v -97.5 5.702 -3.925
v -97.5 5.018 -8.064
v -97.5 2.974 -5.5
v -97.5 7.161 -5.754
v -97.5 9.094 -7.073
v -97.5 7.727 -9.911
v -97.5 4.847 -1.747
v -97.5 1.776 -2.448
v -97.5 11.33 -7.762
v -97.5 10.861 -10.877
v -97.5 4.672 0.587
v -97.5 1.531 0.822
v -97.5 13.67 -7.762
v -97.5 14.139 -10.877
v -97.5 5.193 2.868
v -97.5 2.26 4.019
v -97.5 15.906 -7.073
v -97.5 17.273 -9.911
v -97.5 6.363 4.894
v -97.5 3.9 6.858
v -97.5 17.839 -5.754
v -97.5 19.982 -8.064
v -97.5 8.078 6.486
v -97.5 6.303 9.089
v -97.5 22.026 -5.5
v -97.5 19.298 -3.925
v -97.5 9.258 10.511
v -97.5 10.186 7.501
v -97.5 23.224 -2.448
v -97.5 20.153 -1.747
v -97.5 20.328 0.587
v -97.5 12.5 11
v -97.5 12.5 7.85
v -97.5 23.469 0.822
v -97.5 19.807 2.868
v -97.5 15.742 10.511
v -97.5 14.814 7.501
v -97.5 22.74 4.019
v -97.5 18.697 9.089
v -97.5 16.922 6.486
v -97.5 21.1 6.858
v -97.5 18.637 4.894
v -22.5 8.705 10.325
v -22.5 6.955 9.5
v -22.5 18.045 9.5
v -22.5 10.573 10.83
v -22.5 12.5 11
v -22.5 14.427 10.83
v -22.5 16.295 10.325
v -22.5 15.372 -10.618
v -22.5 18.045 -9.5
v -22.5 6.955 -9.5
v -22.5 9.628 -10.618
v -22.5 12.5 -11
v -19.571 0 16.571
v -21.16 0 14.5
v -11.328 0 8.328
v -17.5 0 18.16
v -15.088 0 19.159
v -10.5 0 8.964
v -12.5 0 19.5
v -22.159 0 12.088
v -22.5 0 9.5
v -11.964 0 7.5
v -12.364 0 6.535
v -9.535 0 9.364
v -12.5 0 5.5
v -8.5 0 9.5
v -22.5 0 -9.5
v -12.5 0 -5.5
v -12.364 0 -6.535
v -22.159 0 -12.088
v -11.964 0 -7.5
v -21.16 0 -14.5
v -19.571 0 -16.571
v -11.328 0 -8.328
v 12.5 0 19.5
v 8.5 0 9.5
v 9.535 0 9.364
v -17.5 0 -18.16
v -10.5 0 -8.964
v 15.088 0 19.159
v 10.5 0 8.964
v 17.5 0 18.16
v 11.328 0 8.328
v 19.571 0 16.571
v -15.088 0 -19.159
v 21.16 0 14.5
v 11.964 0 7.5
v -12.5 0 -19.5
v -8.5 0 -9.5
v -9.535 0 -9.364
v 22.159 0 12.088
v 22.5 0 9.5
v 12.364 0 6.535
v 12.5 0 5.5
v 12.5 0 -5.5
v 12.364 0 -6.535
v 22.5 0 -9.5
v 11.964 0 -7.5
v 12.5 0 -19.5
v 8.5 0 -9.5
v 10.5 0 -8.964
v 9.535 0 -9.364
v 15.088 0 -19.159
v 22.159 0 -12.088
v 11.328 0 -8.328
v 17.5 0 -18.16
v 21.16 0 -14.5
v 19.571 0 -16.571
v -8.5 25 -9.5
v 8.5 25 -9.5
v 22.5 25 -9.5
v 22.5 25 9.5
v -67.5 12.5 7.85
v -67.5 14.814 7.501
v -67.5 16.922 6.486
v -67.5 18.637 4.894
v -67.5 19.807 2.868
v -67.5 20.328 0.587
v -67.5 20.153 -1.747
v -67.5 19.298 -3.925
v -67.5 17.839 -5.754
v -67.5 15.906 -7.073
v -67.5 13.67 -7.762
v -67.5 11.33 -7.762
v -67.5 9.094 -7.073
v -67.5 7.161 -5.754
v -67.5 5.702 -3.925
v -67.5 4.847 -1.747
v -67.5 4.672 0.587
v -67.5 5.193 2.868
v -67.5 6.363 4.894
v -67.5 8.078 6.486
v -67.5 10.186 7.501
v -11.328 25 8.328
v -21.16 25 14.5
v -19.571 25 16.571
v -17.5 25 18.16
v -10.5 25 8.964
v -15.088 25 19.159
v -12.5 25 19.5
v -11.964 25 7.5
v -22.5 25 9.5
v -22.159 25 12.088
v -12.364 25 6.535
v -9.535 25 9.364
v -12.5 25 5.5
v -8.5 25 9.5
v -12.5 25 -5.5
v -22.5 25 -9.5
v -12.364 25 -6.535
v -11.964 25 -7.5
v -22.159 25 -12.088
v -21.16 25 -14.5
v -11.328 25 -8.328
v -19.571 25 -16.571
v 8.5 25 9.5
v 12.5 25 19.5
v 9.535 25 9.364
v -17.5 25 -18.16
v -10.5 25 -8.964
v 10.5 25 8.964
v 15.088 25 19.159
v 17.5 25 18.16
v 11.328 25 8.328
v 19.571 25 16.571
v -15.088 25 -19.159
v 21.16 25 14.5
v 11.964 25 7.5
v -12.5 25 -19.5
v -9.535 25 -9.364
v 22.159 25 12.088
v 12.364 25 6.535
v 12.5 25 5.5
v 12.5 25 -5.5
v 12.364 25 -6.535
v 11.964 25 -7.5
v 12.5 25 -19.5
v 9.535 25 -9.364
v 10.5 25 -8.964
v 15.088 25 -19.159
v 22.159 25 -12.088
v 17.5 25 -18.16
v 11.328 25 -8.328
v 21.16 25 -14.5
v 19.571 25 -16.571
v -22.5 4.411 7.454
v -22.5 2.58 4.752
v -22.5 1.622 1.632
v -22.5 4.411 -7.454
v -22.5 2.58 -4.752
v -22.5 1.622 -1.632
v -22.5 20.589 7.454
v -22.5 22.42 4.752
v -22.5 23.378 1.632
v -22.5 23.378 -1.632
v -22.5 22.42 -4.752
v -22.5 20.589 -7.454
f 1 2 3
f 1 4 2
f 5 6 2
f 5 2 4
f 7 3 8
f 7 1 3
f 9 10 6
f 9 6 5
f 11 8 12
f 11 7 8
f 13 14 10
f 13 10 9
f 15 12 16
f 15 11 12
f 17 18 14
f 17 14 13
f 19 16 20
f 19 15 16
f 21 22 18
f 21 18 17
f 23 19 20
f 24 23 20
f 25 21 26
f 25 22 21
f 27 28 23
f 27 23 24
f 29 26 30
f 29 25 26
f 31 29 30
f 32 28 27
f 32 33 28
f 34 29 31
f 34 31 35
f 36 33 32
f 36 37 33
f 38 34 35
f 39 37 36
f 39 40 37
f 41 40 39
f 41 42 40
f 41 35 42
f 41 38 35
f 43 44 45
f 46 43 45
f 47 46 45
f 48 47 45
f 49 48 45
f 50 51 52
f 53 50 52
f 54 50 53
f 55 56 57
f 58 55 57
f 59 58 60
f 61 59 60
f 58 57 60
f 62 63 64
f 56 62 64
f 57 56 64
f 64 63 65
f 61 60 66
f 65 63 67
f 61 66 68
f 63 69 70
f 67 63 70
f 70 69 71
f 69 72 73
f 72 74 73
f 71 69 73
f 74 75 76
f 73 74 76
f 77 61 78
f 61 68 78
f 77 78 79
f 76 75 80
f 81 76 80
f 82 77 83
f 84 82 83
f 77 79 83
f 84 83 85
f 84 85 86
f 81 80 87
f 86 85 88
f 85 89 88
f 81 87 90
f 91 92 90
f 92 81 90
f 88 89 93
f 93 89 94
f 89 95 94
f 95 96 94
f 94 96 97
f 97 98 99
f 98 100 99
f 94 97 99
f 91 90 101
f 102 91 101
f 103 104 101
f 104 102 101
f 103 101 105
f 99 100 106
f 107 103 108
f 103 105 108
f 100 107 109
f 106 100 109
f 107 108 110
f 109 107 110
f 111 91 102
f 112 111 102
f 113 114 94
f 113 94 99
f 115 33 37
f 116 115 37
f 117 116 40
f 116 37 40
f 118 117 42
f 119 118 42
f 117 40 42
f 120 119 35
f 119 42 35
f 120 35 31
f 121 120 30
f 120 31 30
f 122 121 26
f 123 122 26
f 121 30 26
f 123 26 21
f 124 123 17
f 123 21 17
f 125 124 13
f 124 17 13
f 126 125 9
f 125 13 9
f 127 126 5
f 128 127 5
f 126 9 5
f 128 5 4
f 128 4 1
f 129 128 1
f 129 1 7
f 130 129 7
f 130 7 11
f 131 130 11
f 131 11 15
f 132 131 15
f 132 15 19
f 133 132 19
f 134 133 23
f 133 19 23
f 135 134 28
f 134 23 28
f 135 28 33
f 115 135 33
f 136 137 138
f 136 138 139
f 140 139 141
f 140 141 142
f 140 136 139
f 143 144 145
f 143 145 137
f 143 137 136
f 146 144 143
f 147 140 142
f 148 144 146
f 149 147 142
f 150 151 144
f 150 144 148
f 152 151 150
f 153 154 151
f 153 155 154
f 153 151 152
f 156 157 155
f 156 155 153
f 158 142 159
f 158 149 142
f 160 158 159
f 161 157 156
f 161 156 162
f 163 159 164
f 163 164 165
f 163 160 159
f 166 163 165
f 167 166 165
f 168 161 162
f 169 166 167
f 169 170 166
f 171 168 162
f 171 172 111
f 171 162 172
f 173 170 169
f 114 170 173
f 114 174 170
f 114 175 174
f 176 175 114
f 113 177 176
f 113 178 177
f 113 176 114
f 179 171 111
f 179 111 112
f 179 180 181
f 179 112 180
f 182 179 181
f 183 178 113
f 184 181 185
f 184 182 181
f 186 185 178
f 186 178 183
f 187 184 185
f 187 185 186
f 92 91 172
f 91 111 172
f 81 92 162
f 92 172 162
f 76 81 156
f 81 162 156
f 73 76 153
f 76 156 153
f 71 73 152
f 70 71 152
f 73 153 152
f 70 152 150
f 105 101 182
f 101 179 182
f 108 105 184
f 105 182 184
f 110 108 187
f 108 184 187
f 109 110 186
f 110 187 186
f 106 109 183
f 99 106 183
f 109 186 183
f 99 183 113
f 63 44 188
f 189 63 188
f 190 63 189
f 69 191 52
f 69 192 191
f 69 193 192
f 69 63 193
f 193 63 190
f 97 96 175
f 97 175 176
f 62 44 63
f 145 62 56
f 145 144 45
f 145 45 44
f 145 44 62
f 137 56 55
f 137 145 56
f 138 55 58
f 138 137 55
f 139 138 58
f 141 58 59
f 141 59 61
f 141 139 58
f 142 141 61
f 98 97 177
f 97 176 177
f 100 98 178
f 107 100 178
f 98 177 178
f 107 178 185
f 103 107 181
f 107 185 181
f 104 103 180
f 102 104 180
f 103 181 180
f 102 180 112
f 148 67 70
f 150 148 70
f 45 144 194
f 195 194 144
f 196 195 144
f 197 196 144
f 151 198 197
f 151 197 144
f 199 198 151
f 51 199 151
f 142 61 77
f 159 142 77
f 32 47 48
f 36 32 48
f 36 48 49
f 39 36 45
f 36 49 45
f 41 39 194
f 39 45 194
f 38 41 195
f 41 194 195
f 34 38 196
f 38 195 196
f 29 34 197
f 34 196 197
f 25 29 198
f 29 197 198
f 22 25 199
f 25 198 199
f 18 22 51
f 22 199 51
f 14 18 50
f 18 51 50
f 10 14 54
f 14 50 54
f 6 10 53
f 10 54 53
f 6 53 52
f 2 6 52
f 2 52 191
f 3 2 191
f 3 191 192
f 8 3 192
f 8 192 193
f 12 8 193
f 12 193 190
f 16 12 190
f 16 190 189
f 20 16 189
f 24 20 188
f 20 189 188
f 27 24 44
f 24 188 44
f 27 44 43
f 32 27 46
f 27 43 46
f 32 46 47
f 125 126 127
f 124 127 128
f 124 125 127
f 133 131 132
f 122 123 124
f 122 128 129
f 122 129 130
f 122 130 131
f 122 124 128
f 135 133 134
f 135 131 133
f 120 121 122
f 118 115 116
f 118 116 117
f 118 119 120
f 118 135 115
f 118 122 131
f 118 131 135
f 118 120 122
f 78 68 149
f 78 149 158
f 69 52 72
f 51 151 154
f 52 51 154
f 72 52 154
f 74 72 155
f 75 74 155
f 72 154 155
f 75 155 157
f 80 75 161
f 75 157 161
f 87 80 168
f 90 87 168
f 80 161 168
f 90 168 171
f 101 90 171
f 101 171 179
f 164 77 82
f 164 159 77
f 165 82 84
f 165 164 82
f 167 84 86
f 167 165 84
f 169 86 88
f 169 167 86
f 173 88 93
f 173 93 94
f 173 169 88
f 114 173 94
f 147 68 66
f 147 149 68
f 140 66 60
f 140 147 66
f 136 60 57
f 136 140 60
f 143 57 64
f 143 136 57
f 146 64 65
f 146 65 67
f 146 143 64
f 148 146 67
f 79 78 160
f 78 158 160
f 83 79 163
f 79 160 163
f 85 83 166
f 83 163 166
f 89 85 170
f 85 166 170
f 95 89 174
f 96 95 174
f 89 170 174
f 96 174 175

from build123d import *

# Parameters (mm, degrees)
SKETCH1_W           = 45
SKETCH1_H           = 39
SKETCH1_W_2         = 25
SKETCH1_H_2         = 19
EXTRUDE_THIN1_DEPTH = 25
FILLET1_R           = 10
FILLET2_R           = 4
SKETCH2_R           = 11
BOSS_EXTRUDE1_DEPTH = 75
SKETCH3_R           = 7.85
CUT_EXTRUDE1_DEPTH  = 30


with BuildPart() as part:
    # Sketch1 → Extrude-Thin1 (new body)
    with BuildSketch(Plane(origin=(0, 0, 0), x_dir=(1, 0, 0), z_dir=(0, 1, 0))):
        Rectangle(SKETCH1_W, SKETCH1_H)
        Rectangle(SKETCH1_W_2, SKETCH1_H_2, mode=Mode.SUBTRACT)
    extrude(amount=EXTRUDE_THIN1_DEPTH)

    # Fillet1
    fillet1_edges = [part.edges().sort_by_distance(p)[0] for p in [
        (22.5, 12.5, 19.5),
        (-22.5, 12.5, 19.5),
        (-22.5, 12.5, -19.5),
        (22.5, 12.5, -19.5),
    ]]
    fillet(fillet1_edges, radius=FILLET1_R)

    # Fillet2
    fillet2_edges = [part.edges().sort_by_distance(p)[0] for p in [
        (12.5, 12.5, 9.5),
        (12.5, 12.5, -9.5),
        (-12.5, 12.5, -9.5),
        (-12.5, 12.5, 9.5),
    ]]
    fillet(fillet2_edges, radius=FILLET2_R)

    # Sketch2 → Boss-Extrude1 (add)
    with BuildSketch(Plane(origin=(-22.5, 0, 3), x_dir=(0, 0, 1), z_dir=(-1, 0, 0))):
        with Locations((-3, 12.5)):
            Circle(SKETCH2_R)
    extrude(amount=BOSS_EXTRUDE1_DEPTH)

    # Sketch3 → Cut-Extrude1 (cut)
    with BuildSketch(Plane.ZY.offset(97.5)):
        with Locations((0, 12.5)):
            Circle(SKETCH3_R)
    extrude(amount=-CUT_EXTRUDE1_DEPTH, mode=Mode.SUBTRACT)


solid = part.part
